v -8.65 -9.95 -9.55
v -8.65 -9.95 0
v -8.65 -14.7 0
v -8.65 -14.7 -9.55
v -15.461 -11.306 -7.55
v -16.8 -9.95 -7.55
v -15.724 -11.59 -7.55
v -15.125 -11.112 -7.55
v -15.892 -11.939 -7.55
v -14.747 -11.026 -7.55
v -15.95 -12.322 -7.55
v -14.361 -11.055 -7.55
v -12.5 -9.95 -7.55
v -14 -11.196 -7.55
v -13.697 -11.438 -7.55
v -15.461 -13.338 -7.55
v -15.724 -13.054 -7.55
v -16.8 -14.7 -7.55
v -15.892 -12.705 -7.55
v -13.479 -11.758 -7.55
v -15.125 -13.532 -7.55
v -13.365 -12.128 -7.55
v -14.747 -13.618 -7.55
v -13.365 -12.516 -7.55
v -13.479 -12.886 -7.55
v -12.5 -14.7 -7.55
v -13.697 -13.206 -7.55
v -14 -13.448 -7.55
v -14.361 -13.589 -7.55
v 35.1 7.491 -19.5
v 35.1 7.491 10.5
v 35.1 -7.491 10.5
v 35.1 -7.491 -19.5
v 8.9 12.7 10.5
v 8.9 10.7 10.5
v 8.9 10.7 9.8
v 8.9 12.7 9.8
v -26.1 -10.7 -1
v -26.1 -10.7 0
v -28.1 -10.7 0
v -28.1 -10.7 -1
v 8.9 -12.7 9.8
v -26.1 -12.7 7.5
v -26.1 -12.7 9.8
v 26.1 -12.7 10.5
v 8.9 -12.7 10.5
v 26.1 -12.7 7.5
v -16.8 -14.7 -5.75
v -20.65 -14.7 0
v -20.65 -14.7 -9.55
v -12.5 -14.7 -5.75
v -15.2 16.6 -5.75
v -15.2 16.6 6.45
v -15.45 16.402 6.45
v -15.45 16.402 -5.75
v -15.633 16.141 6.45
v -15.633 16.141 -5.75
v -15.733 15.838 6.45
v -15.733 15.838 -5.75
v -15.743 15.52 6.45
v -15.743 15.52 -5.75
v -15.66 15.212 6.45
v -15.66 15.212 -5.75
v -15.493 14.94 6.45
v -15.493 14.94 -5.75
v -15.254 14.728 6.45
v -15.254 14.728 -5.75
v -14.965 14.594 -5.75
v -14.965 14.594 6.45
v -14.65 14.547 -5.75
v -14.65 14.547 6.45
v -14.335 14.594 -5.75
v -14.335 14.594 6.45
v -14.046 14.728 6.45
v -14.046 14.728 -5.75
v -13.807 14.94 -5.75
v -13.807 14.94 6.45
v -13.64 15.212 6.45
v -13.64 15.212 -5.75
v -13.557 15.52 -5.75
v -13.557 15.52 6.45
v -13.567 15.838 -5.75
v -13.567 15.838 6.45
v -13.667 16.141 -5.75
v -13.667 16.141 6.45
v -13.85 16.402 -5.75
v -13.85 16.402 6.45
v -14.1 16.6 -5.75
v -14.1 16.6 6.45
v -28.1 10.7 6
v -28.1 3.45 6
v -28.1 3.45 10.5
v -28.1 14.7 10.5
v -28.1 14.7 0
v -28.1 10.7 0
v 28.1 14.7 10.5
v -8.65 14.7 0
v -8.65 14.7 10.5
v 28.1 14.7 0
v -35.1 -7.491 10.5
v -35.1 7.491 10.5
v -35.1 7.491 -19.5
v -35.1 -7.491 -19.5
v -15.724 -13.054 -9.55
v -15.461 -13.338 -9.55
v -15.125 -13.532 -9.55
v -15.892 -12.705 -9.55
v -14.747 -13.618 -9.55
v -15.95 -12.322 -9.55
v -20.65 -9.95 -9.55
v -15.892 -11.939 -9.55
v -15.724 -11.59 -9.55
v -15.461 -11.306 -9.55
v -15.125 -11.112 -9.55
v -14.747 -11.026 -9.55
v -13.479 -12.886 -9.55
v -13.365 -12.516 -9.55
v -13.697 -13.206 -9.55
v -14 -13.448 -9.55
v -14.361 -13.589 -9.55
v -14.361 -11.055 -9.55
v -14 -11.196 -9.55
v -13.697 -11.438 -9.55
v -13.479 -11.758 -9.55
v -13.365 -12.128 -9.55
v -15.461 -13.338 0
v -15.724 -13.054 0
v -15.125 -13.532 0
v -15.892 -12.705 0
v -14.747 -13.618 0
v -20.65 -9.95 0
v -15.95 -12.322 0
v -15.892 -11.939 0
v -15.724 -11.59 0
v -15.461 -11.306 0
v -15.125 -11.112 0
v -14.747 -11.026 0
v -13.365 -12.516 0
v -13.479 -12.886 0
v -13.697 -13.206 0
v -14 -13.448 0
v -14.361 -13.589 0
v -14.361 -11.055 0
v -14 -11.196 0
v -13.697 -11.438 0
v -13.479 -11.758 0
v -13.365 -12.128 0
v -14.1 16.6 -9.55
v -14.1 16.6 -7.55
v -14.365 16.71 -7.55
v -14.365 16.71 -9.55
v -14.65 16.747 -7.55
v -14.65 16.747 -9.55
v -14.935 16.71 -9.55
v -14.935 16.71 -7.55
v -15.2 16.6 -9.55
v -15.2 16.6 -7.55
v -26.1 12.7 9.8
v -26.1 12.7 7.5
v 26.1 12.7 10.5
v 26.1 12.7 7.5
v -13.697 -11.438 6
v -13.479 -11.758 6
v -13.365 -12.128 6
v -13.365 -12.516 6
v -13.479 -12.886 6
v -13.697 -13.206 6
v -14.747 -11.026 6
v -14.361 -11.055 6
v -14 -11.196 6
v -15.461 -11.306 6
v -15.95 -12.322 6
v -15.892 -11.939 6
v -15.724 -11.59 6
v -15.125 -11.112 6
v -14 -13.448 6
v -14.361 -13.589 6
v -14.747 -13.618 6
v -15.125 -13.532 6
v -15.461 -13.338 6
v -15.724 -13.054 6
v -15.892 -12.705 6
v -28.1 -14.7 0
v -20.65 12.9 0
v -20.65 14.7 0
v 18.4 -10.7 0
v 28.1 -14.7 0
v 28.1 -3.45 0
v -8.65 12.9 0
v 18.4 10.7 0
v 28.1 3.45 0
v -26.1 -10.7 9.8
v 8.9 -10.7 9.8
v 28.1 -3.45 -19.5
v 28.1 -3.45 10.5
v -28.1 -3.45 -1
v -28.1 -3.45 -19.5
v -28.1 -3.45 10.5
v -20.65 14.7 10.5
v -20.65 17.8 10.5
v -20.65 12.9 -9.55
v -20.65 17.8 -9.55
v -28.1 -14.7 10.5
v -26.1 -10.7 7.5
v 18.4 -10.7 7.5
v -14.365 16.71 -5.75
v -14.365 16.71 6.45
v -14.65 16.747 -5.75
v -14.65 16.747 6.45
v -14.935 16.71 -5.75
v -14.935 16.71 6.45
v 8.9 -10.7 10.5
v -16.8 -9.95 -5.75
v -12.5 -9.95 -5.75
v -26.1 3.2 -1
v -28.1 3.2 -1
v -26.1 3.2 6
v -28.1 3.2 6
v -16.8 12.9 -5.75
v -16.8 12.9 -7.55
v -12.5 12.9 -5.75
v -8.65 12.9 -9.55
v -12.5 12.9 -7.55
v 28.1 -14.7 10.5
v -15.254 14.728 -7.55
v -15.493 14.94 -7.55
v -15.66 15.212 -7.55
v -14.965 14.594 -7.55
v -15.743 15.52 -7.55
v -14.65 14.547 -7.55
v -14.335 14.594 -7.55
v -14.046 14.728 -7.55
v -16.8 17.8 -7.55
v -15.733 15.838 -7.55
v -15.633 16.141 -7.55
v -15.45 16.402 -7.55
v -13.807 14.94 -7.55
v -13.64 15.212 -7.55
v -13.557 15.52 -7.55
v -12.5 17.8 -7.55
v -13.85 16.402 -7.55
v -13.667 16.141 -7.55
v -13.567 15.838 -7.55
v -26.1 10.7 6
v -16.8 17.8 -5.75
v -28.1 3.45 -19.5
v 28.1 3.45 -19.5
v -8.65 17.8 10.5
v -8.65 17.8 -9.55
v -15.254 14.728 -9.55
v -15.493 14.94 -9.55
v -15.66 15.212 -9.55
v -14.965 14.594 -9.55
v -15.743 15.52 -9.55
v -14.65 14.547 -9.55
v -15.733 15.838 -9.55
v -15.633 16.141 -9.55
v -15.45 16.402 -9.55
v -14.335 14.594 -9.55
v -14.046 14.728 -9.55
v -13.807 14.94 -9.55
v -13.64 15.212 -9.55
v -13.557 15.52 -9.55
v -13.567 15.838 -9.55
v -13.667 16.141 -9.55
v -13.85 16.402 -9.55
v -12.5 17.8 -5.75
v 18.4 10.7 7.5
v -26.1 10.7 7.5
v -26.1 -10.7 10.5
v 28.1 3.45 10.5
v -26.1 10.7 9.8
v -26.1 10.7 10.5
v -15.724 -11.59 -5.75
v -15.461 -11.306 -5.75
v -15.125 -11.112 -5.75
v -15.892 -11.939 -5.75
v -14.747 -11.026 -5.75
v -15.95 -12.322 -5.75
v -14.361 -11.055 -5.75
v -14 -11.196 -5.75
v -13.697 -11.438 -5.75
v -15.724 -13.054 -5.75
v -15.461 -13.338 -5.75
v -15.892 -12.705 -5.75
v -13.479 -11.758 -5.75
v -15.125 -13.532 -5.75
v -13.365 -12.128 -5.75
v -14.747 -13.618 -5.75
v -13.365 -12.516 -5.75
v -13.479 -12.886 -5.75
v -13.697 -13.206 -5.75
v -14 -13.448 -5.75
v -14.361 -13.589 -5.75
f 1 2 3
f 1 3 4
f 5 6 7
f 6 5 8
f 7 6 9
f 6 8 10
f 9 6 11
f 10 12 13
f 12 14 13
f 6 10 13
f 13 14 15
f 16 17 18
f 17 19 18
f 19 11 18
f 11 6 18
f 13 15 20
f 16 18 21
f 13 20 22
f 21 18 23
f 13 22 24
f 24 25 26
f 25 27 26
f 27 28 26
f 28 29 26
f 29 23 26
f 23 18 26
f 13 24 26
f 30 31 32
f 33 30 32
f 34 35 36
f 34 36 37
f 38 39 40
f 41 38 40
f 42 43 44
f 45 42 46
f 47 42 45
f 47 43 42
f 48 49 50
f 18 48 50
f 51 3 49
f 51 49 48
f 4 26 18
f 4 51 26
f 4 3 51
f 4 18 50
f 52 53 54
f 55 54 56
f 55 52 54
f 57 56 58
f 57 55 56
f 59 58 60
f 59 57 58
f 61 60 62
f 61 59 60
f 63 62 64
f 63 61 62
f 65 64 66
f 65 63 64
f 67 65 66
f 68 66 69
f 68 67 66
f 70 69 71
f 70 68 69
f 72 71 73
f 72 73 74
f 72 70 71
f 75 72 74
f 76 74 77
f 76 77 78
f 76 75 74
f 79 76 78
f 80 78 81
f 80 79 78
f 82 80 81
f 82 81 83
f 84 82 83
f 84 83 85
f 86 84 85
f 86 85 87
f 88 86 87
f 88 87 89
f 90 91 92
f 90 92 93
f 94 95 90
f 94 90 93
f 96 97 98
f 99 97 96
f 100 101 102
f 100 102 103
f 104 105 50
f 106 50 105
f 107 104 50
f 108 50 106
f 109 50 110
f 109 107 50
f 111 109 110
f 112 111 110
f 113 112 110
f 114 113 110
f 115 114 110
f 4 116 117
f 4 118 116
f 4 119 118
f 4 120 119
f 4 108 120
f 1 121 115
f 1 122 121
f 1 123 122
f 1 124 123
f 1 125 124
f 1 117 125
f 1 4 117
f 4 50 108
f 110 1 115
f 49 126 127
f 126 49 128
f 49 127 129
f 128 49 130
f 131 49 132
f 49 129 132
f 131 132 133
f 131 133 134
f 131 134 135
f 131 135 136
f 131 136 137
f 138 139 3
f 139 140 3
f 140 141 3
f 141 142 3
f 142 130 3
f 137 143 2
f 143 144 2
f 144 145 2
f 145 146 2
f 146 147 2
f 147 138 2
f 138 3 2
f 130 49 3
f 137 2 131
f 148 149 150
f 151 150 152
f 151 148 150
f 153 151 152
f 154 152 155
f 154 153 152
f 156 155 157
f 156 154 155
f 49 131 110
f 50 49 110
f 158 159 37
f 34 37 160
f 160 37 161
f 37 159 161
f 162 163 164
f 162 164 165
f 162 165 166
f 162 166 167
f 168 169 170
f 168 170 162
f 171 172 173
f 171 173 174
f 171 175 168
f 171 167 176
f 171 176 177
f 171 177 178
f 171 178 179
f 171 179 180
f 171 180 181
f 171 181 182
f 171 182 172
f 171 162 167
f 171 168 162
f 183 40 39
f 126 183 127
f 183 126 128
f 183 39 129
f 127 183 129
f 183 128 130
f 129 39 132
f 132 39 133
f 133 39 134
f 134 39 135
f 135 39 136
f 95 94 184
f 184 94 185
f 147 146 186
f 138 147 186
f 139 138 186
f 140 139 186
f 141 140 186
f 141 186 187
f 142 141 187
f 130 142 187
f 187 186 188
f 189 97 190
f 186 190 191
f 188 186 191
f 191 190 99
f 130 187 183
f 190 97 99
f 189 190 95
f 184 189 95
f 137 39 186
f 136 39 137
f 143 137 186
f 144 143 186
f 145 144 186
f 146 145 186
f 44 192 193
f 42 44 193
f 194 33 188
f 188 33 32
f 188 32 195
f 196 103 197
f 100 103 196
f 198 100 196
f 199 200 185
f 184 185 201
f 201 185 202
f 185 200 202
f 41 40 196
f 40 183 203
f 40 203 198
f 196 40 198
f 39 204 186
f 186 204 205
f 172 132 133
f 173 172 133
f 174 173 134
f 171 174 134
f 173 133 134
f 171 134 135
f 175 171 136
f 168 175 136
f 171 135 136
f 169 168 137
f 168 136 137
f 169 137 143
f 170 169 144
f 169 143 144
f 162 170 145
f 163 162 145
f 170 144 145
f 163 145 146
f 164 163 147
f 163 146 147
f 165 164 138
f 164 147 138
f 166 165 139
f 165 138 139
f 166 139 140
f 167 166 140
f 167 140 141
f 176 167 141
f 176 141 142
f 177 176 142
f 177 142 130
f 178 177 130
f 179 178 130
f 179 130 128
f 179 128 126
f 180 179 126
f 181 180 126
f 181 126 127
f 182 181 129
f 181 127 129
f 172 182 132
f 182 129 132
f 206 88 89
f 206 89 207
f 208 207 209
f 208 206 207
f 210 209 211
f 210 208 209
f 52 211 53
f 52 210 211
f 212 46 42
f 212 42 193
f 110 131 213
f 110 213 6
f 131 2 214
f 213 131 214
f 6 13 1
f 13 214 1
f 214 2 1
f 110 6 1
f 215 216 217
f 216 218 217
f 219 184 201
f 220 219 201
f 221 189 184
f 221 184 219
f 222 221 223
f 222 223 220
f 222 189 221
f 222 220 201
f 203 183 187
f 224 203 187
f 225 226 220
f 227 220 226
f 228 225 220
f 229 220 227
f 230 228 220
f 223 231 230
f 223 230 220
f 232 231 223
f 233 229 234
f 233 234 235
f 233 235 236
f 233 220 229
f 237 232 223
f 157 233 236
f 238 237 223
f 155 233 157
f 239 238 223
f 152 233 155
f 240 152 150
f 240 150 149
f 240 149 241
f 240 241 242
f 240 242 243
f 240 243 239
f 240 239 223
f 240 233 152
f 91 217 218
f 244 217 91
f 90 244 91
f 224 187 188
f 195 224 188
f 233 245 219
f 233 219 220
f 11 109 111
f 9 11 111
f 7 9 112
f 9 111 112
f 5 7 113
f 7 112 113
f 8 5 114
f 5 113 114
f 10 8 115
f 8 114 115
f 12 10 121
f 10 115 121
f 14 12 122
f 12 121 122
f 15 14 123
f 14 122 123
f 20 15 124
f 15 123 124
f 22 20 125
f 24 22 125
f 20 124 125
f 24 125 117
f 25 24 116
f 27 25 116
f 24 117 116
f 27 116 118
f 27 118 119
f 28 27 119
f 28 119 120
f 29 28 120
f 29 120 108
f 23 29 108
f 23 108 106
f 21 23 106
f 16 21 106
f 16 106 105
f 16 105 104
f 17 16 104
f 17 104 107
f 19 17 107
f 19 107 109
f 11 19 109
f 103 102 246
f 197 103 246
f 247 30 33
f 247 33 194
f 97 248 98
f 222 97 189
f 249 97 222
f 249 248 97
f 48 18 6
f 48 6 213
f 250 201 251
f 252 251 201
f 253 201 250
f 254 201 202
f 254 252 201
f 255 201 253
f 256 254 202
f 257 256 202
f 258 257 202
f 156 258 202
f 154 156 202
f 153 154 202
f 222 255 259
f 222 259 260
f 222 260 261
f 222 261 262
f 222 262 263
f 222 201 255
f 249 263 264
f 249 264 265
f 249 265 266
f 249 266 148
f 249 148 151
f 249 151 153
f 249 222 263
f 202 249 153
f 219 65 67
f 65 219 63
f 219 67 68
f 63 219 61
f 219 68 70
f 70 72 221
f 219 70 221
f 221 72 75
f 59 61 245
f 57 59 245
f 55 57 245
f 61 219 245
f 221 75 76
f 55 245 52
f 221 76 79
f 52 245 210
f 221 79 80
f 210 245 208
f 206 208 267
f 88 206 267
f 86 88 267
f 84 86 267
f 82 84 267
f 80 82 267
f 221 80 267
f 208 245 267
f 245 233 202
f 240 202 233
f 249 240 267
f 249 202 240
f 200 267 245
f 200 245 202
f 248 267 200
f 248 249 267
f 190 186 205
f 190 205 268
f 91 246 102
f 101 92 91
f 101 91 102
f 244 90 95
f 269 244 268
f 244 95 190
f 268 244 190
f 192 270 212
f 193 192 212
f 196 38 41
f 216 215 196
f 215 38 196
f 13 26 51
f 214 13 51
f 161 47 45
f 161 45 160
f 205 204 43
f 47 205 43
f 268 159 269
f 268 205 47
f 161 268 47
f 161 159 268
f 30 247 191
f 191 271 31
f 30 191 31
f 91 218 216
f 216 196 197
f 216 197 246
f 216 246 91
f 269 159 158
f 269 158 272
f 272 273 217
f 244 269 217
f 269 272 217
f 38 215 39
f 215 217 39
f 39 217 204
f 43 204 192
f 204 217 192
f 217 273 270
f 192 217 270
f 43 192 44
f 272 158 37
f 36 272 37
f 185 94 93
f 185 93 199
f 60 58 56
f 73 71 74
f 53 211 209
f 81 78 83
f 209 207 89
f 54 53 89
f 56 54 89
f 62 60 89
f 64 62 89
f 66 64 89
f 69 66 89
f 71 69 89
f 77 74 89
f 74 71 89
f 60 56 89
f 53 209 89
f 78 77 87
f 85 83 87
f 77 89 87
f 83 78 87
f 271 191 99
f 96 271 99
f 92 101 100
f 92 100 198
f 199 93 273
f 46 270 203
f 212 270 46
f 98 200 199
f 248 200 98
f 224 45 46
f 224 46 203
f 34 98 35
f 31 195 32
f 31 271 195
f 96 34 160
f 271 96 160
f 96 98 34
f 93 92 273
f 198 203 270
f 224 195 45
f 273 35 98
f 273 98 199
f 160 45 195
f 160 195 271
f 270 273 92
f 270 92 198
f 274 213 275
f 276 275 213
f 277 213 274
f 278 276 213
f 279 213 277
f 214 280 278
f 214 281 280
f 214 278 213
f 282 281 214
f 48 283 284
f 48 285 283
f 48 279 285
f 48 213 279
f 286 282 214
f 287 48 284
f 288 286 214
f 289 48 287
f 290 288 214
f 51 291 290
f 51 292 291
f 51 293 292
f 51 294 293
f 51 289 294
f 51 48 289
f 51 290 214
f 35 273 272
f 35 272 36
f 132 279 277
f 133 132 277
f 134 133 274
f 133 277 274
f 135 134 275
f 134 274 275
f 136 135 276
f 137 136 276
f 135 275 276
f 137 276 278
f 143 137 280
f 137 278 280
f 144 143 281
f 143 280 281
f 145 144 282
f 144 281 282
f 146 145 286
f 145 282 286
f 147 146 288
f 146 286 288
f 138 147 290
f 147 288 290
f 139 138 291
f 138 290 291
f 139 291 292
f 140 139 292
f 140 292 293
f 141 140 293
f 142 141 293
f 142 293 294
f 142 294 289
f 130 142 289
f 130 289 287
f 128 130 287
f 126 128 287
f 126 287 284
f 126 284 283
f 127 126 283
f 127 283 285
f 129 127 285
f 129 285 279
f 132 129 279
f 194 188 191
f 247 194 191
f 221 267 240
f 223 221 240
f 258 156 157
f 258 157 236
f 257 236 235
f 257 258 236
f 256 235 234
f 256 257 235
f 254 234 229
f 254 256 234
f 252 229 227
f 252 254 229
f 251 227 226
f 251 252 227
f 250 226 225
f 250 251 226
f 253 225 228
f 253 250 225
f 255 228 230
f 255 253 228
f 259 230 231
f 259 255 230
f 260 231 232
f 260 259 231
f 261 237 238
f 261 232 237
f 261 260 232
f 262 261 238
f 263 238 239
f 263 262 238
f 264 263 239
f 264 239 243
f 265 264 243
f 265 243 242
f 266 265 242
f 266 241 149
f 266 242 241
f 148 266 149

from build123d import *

# Parameters (mm, degrees)
SKETCH1_W                = 52.2
SKETCH1_H                = 25.4
SKETCH1_W_2              = 48.2
SKETCH1_H_2              = 21.4
SKETCH1_W_3              = 5.7
BOSS_EXTRUDE1_DEPTH      = 7.5
BOSS_EXTRUDE2_DEPTH      = 3
BOSS_EXTRUDE2_DEPTH_BACK = 7.5
SKETCH2_W                = 56.2
SKETCH2_H                = 29.4
SKETCH2_W_2              = 52.2
SKETCH2_H_2              = 25.4
BOSS_EXTRUDE5_DEPTH      = 30
BOSS_EXTRUDE12_DEPTH     = 12
CUT_EXTRUDE2_DEPTH       = 16
CUT_EXTRUDE3_REACH       = 53.658
SKETCH12_W               = 4.3
SKETCH12_H               = 1.8
SKETCH13_W               = 9.55
SKETCH13_H               = 4.75
BOSS_EXTRUDE14_DEPTH     = 12
SKETCH14_R               = 1.3
CUT_EXTRUDE4_DEPTH       = 16
SKETCH15_W               = 4.3
SKETCH15_H               = 1.8
CUT_EXTRUDE5_DEPTH       = 10
SKETCH16_W               = 4
SKETCH16_H               = 21.4
CUT_EXTRUDE6_DEPTH       = 4
SKETCH17_W               = 35
SKETCH17_H               = 2
BOSS_EXTRUDE15_DEPTH     = 0.7
SKETCH18_R               = 1.3
CUT_EXTRUDE7_DEPTH       = 6
SKETCH19_W               = 2
SKETCH19_H               = 21.4
CUT_EXTRUDE8_DEPTH       = 14
SKETCH20_W               = 2
SKETCH20_H               = 7.5
CUT_EXTRUDE9_DEPTH       = 2
BOSS_EXTRUDE16_DEPTH     = 5


with BuildPart() as part:
    # Sketch1 → Boss-Extrude1 (new body)
    # profile 1 of 2: a face of its own
    with BuildSketch(Plane.XY):
        Rectangle(SKETCH1_W, SKETCH1_H)
        Rectangle(SKETCH1_W_2, SKETCH1_H_2, mode=Mode.SUBTRACT)
    # profile 2 of 2: a face of its own
    with BuildSketch(Plane.XY):
        with Locations((21.25, 0)):
            Rectangle(SKETCH1_W_3, SKETCH1_H_2)
    extrude(amount=BOSS_EXTRUDE1_DEPTH)

    # Sketch2 → Boss-Extrude2 (add, two sides: drawn at the far end of the back side and taken through both)
    with BuildSketch(Plane.XY.offset(7.5).offset(-BOSS_EXTRUDE2_DEPTH_BACK)):
        Rectangle(SKETCH2_W, SKETCH2_H)
        Rectangle(SKETCH2_W_2, SKETCH2_H_2, mode=Mode.SUBTRACT)
    extrude(amount=BOSS_EXTRUDE2_DEPTH + BOSS_EXTRUDE2_DEPTH_BACK)

    # Sketch6 → Boss-Extrude5 (add)
    with BuildSketch(Plane.XY.offset(10.5)):
        Polygon((-28.1, 3.45), (-35.1, 7.491451884), (-35.1, -7.491451884), (-28.1, -3.45), align=None)
    boss_extrude5 = extrude(amount=-BOSS_EXTRUDE5_DEPTH)

    # Mirror1: Boss-Extrude5 across plane
    add(boss_extrude5.mirror(Plane(origin=(0, 0, 0), x_dir=(0, 0, 1), z_dir=(1, 0, 0))))

    # Sketch10 → Boss-Extrude12 (add)
    with BuildSketch(Plane(origin=(-8.65, 0, 0), x_dir=(0, 0, -1), z_dir=(1, 0, 0))):
        Polygon((9.55, 12.9), (9.55, 17.8), (-10.5, 17.8), (-10.5, 14.7), (0, 14.7), (0, 12.9), align=None)
    extrude(amount=-BOSS_EXTRUDE12_DEPTH)

    # Sketch11 → Cut-Extrude2 (cut)
    with BuildSketch(Plane(origin=(0, 0, -9.55), x_dir=(-1, 0, 0), z_dir=(0, 0, -1))):
        with BuildLine():
            ThreePointArc((14.1, 16.6), (14.65, 16.747372056), (15.2, 16.6))
            ThreePointArc((15.2, 16.6), (14.65, 14.547372056), (14.1, 16.6))
        make_face()
    extrude(amount=-CUT_EXTRUDE2_DEPTH, mode=Mode.SUBTRACT)

    # Sketch12 → Cut-Extrude3 (cut, up to next)
    with BuildSketch(Plane(origin=(0, 17.8, 0), x_dir=(1, 0, 0), z_dir=(0, 1, 0)), mode=Mode.PRIVATE) as cut_extrude3_sk1:
        with Locations((-14.65, 6.65)):
            Rectangle(SKETCH12_W, SKETCH12_H)
    cut_extrude3_tool1 = extrude(cut_extrude3_sk1.sketch, amount=-CUT_EXTRUDE3_REACH, mode=Mode.PRIVATE) & part.part
    add(cut_extrude3_tool1.solids().sort_by_distance((-14.65, 17.8, -6.65))[0], mode=Mode.SUBTRACT)

    # Sketch16 → Cut-Extrude6 (cut)
    with BuildSketch(Plane(origin=(0, 0, 0), x_dir=(-1, 0, 0), z_dir=(0, 0, -1))):
        with Locations((26.1, 0)):
            Rectangle(SKETCH16_W, SKETCH16_H)
    extrude(amount=-CUT_EXTRUDE6_DEPTH, mode=Mode.SUBTRACT)

    # Sketch17 → Boss-Extrude15 (add)
    with BuildSketch(Plane.XY.offset(10.5)):
        with Locations((-8.6, 11.7)):
            Rectangle(SKETCH17_W, SKETCH17_H)
        with Locations((-8.6, -11.7)):
            Rectangle(SKETCH17_W, SKETCH17_H)
    extrude(amount=-BOSS_EXTRUDE15_DEPTH)

    # Sketch18 → Cut-Extrude7 (cut)
    with BuildSketch(Plane(origin=(0, 0, 0), x_dir=(-1, 0, 0), z_dir=(0, 0, -1))):
        with Locations((14.65, -12.322078101)):
            Circle(SKETCH18_R)
    extrude(amount=-CUT_EXTRUDE7_DEPTH, mode=Mode.SUBTRACT)

    # Sketch19 → Cut-Extrude8 (cut)
    with BuildSketch(Plane.XY.offset(7.5)):
        with Locations((-25.1, 0)):
            Rectangle(SKETCH19_W, SKETCH19_H)
    extrude(amount=-CUT_EXTRUDE8_DEPTH, mode=Mode.SUBTRACT)

    # Sketch20 → Cut-Extrude9 (cut)
    with BuildSketch(Plane(origin=(0, 0, 4), x_dir=(-1, 0, 0), z_dir=(0, 0, -1))):
        with Locations((27.1, 6.95)):
            Rectangle(SKETCH20_W, SKETCH20_H)
    extrude(amount=-CUT_EXTRUDE9_DEPTH, mode=Mode.SUBTRACT)

    # Sketch21 → Boss-Extrude16 (add)
    with BuildSketch(Plane(origin=(0, 0, 4), x_dir=(-1, 0, 0), z_dir=(0, 0, -1))):
        Polygon((28.1, -10.7), (28.1, -3.45), (28.1, 3.2), (26.1, 3.2), (26.1, -10.7), align=None)
    extrude(amount=BOSS_EXTRUDE16_DEPTH)


with BuildPart() as body_2:
    # Sketch13 → Boss-Extrude14 (new body)
    with BuildSketch(Plane(origin=(-8.65, 0, 0), x_dir=(0, 0, -1), z_dir=(1, 0, 0))):
        with Locations((4.775, -12.325)):
            Rectangle(SKETCH13_W, SKETCH13_H)
    extrude(amount=-BOSS_EXTRUDE14_DEPTH)

    # Sketch14 → Cut-Extrude4 (cut)
    with BuildSketch(Plane(origin=(0, 0, -9.55), x_dir=(-1, 0, 0), z_dir=(0, 0, -1))):
        with Locations((14.65, -12.322078101)):
            Circle(SKETCH14_R)
    extrude(amount=-CUT_EXTRUDE4_DEPTH, mode=Mode.SUBTRACT)

    # Sketch15 → Cut-Extrude5 (cut)
    with BuildSketch(Plane.XZ.offset(14.7)):
        with Locations((-14.65, -6.65)):
            Rectangle(SKETCH15_W, SKETCH15_H)
    extrude(amount=-CUT_EXTRUDE5_DEPTH, mode=Mode.SUBTRACT)


solid = Compound([part.part, body_2.part])
